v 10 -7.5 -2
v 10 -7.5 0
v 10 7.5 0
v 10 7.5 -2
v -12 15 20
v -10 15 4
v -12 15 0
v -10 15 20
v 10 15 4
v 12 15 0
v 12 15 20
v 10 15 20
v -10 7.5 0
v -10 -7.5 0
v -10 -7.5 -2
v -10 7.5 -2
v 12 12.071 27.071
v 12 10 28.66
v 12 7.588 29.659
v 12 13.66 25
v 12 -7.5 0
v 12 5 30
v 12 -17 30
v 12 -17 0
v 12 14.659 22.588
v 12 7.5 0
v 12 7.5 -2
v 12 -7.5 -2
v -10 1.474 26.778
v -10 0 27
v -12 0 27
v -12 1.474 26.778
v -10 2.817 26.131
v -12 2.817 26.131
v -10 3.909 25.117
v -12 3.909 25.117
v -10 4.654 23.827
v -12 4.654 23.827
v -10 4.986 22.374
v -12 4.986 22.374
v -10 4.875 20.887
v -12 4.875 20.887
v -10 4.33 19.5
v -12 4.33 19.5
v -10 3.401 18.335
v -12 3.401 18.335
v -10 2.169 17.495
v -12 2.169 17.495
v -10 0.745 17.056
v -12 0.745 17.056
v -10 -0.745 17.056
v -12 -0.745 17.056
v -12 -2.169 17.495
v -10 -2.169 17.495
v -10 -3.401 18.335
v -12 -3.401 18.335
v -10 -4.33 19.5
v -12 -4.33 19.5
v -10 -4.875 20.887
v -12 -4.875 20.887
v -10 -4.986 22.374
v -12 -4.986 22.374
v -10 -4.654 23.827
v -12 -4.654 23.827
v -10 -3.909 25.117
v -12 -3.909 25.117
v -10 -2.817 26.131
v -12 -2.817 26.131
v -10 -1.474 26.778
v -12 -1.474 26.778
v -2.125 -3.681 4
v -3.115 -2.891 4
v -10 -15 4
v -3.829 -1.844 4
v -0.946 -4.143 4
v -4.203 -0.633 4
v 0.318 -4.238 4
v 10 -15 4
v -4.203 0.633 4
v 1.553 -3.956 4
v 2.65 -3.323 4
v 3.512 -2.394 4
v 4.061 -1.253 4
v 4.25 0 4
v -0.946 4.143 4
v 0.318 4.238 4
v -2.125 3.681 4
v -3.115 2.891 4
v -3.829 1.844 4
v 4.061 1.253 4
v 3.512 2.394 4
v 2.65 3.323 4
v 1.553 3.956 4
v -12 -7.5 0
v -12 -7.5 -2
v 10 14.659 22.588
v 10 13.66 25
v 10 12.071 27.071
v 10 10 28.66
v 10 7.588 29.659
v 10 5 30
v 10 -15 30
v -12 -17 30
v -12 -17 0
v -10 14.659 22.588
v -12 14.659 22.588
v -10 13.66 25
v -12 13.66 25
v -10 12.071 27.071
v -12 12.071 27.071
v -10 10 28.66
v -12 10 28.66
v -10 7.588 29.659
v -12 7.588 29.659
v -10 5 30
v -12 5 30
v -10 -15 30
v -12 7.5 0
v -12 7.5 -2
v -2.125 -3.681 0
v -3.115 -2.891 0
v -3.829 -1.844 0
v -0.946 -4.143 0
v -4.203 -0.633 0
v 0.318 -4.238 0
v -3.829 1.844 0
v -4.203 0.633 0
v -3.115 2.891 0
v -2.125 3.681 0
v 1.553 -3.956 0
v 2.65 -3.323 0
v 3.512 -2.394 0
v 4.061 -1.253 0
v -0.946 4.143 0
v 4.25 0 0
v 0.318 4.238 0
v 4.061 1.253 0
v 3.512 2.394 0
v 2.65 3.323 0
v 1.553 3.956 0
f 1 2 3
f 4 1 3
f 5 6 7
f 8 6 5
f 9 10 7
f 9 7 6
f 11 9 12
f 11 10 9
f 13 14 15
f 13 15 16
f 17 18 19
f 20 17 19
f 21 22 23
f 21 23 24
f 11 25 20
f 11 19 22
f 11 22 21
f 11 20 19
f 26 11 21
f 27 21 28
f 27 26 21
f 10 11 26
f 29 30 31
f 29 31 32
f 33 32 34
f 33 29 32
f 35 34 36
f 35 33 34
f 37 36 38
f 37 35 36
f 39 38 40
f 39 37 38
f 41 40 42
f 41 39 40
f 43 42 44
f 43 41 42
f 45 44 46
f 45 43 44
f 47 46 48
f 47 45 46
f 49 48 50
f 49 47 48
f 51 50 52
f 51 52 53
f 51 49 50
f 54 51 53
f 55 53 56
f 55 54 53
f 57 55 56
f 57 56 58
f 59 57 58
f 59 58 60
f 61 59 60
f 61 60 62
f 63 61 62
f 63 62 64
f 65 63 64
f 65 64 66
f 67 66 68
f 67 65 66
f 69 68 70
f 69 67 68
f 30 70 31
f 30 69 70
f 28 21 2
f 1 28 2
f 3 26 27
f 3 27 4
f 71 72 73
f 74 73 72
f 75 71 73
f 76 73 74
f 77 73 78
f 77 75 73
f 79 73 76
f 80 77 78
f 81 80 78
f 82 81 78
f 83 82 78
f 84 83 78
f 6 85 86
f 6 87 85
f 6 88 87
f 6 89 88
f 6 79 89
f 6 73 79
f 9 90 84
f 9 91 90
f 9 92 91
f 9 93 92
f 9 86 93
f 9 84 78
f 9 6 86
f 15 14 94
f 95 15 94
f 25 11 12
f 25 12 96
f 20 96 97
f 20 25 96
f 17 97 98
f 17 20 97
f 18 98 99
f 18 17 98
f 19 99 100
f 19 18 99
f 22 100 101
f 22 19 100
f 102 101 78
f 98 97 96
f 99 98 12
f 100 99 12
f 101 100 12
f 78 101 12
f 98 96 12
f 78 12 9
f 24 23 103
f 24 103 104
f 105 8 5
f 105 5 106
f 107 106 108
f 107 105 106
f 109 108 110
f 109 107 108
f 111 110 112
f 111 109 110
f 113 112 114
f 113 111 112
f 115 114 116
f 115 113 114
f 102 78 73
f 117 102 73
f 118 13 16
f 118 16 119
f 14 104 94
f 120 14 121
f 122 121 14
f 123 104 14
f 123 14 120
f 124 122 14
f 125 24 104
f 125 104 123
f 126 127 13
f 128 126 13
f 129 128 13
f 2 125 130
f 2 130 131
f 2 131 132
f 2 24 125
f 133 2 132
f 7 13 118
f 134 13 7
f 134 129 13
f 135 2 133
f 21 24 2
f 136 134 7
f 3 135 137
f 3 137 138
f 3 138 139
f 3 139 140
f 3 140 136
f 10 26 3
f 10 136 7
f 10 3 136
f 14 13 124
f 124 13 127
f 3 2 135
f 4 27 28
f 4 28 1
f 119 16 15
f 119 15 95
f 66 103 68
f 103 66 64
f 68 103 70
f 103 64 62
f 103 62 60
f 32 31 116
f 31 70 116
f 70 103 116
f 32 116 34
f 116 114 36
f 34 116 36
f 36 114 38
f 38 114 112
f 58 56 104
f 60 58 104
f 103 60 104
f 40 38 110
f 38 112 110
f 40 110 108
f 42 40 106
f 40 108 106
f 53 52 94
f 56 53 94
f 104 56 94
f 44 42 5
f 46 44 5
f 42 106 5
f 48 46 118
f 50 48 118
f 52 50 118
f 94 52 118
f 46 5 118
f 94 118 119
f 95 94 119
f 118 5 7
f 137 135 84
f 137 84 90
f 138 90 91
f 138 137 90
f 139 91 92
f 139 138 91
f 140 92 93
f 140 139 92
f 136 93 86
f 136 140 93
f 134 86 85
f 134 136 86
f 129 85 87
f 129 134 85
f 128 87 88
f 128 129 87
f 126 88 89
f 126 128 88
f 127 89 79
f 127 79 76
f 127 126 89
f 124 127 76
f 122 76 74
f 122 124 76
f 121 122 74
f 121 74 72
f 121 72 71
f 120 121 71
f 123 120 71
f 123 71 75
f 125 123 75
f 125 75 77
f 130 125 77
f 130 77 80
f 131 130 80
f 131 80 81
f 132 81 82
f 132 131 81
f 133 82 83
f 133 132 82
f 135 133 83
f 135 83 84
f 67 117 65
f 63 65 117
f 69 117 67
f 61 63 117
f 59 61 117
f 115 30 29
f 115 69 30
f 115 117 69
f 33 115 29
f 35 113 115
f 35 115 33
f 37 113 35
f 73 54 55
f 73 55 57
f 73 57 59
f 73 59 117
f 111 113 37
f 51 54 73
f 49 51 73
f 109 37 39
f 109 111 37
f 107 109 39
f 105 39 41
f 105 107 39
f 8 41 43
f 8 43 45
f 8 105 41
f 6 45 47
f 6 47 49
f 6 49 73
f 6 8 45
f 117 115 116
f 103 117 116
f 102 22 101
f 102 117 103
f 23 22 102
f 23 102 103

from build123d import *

# Parameters (mm, degrees)
SKETCH1_W           = 20
SKETCH1_H           = 30
SKETCH1_R           = 4.25
BOSS_EXTRUDE1_DEPTH = 4
SKETCH2_W           = 20
SKETCH2_H           = 30
BOSS_EXTRUDE2_DEPTH = 2
SKETCH4_R           = 5
BOSS_EXTRUDE3_DEPTH = 2
BOSS_EXTRUDE4_START = 2
BOSS_EXTRUDE4_DEPTH = 2
SKETCH6_W           = 2
SKETCH6_H           = 15
BOSS_EXTRUDE5_DEPTH = 2


with BuildPart() as part:
    # Sketch1 → Boss-Extrude1 (new body)
    with BuildSketch(Plane.XY):
        Rectangle(SKETCH1_W, SKETCH1_H)
        Circle(SKETCH1_R, mode=Mode.SUBTRACT)
    extrude(amount=BOSS_EXTRUDE1_DEPTH)

    # Sketch2 → Boss-Extrude2 (add)
    with BuildSketch(Plane(origin=(0, -15, 0), x_dir=(-1, 0, 0), z_dir=(0, -1, 0))):
        with Locations((0, -15)):
            Rectangle(SKETCH2_W, SKETCH2_H)
    extrude(amount=BOSS_EXTRUDE2_DEPTH)

    # Sketch4 → Boss-Extrude3 (add)
    with BuildSketch(Plane.ZY.offset(10)):
        with BuildLine():
            Line((0, 15), (20, 15))
            ThreePointArc((20, 15), (27.071067812, 12.071067812), (30, 5))
            Line((30, 5), (30, -17))
            Line((30, -17), (0, -17))
            Line((0, -17), (0, 15))
        make_face()
        with Locations((22, 0)):
            Circle(SKETCH4_R, mode=Mode.SUBTRACT)
    extrude(amount=BOSS_EXTRUDE3_DEPTH)

    # Sketch5 → Boss-Extrude4 (add)
    with BuildSketch(Plane(origin=(10, 0, 0), x_dir=(0, 0, -1), z_dir=(1, 0, 0)).offset(BOSS_EXTRUDE4_START)):
        with BuildLine():
            Line((0, 15), (-20, 15))
            ThreePointArc((-20, 15), (-27.071067812, 12.071067812), (-30, 5))
            Line((-30, 5), (-30, -17))
            Line((-30, -17), (0, -17))
            Line((0, -17), (0, 15))
        make_face()
    extrude(amount=-BOSS_EXTRUDE4_DEPTH)

    # Sketch6 → Boss-Extrude5 (add)
    with BuildSketch(Plane(origin=(0, 0, 0), x_dir=(-1, 0, 0), z_dir=(0, 0, -1))):
        with Locations((-11, 0)):
            Rectangle(SKETCH6_W, SKETCH6_H)
        with Locations((11, 0)):
            Rectangle(SKETCH6_W, SKETCH6_H)
    extrude(amount=BOSS_EXTRUDE5_DEPTH)


solid = part.part
